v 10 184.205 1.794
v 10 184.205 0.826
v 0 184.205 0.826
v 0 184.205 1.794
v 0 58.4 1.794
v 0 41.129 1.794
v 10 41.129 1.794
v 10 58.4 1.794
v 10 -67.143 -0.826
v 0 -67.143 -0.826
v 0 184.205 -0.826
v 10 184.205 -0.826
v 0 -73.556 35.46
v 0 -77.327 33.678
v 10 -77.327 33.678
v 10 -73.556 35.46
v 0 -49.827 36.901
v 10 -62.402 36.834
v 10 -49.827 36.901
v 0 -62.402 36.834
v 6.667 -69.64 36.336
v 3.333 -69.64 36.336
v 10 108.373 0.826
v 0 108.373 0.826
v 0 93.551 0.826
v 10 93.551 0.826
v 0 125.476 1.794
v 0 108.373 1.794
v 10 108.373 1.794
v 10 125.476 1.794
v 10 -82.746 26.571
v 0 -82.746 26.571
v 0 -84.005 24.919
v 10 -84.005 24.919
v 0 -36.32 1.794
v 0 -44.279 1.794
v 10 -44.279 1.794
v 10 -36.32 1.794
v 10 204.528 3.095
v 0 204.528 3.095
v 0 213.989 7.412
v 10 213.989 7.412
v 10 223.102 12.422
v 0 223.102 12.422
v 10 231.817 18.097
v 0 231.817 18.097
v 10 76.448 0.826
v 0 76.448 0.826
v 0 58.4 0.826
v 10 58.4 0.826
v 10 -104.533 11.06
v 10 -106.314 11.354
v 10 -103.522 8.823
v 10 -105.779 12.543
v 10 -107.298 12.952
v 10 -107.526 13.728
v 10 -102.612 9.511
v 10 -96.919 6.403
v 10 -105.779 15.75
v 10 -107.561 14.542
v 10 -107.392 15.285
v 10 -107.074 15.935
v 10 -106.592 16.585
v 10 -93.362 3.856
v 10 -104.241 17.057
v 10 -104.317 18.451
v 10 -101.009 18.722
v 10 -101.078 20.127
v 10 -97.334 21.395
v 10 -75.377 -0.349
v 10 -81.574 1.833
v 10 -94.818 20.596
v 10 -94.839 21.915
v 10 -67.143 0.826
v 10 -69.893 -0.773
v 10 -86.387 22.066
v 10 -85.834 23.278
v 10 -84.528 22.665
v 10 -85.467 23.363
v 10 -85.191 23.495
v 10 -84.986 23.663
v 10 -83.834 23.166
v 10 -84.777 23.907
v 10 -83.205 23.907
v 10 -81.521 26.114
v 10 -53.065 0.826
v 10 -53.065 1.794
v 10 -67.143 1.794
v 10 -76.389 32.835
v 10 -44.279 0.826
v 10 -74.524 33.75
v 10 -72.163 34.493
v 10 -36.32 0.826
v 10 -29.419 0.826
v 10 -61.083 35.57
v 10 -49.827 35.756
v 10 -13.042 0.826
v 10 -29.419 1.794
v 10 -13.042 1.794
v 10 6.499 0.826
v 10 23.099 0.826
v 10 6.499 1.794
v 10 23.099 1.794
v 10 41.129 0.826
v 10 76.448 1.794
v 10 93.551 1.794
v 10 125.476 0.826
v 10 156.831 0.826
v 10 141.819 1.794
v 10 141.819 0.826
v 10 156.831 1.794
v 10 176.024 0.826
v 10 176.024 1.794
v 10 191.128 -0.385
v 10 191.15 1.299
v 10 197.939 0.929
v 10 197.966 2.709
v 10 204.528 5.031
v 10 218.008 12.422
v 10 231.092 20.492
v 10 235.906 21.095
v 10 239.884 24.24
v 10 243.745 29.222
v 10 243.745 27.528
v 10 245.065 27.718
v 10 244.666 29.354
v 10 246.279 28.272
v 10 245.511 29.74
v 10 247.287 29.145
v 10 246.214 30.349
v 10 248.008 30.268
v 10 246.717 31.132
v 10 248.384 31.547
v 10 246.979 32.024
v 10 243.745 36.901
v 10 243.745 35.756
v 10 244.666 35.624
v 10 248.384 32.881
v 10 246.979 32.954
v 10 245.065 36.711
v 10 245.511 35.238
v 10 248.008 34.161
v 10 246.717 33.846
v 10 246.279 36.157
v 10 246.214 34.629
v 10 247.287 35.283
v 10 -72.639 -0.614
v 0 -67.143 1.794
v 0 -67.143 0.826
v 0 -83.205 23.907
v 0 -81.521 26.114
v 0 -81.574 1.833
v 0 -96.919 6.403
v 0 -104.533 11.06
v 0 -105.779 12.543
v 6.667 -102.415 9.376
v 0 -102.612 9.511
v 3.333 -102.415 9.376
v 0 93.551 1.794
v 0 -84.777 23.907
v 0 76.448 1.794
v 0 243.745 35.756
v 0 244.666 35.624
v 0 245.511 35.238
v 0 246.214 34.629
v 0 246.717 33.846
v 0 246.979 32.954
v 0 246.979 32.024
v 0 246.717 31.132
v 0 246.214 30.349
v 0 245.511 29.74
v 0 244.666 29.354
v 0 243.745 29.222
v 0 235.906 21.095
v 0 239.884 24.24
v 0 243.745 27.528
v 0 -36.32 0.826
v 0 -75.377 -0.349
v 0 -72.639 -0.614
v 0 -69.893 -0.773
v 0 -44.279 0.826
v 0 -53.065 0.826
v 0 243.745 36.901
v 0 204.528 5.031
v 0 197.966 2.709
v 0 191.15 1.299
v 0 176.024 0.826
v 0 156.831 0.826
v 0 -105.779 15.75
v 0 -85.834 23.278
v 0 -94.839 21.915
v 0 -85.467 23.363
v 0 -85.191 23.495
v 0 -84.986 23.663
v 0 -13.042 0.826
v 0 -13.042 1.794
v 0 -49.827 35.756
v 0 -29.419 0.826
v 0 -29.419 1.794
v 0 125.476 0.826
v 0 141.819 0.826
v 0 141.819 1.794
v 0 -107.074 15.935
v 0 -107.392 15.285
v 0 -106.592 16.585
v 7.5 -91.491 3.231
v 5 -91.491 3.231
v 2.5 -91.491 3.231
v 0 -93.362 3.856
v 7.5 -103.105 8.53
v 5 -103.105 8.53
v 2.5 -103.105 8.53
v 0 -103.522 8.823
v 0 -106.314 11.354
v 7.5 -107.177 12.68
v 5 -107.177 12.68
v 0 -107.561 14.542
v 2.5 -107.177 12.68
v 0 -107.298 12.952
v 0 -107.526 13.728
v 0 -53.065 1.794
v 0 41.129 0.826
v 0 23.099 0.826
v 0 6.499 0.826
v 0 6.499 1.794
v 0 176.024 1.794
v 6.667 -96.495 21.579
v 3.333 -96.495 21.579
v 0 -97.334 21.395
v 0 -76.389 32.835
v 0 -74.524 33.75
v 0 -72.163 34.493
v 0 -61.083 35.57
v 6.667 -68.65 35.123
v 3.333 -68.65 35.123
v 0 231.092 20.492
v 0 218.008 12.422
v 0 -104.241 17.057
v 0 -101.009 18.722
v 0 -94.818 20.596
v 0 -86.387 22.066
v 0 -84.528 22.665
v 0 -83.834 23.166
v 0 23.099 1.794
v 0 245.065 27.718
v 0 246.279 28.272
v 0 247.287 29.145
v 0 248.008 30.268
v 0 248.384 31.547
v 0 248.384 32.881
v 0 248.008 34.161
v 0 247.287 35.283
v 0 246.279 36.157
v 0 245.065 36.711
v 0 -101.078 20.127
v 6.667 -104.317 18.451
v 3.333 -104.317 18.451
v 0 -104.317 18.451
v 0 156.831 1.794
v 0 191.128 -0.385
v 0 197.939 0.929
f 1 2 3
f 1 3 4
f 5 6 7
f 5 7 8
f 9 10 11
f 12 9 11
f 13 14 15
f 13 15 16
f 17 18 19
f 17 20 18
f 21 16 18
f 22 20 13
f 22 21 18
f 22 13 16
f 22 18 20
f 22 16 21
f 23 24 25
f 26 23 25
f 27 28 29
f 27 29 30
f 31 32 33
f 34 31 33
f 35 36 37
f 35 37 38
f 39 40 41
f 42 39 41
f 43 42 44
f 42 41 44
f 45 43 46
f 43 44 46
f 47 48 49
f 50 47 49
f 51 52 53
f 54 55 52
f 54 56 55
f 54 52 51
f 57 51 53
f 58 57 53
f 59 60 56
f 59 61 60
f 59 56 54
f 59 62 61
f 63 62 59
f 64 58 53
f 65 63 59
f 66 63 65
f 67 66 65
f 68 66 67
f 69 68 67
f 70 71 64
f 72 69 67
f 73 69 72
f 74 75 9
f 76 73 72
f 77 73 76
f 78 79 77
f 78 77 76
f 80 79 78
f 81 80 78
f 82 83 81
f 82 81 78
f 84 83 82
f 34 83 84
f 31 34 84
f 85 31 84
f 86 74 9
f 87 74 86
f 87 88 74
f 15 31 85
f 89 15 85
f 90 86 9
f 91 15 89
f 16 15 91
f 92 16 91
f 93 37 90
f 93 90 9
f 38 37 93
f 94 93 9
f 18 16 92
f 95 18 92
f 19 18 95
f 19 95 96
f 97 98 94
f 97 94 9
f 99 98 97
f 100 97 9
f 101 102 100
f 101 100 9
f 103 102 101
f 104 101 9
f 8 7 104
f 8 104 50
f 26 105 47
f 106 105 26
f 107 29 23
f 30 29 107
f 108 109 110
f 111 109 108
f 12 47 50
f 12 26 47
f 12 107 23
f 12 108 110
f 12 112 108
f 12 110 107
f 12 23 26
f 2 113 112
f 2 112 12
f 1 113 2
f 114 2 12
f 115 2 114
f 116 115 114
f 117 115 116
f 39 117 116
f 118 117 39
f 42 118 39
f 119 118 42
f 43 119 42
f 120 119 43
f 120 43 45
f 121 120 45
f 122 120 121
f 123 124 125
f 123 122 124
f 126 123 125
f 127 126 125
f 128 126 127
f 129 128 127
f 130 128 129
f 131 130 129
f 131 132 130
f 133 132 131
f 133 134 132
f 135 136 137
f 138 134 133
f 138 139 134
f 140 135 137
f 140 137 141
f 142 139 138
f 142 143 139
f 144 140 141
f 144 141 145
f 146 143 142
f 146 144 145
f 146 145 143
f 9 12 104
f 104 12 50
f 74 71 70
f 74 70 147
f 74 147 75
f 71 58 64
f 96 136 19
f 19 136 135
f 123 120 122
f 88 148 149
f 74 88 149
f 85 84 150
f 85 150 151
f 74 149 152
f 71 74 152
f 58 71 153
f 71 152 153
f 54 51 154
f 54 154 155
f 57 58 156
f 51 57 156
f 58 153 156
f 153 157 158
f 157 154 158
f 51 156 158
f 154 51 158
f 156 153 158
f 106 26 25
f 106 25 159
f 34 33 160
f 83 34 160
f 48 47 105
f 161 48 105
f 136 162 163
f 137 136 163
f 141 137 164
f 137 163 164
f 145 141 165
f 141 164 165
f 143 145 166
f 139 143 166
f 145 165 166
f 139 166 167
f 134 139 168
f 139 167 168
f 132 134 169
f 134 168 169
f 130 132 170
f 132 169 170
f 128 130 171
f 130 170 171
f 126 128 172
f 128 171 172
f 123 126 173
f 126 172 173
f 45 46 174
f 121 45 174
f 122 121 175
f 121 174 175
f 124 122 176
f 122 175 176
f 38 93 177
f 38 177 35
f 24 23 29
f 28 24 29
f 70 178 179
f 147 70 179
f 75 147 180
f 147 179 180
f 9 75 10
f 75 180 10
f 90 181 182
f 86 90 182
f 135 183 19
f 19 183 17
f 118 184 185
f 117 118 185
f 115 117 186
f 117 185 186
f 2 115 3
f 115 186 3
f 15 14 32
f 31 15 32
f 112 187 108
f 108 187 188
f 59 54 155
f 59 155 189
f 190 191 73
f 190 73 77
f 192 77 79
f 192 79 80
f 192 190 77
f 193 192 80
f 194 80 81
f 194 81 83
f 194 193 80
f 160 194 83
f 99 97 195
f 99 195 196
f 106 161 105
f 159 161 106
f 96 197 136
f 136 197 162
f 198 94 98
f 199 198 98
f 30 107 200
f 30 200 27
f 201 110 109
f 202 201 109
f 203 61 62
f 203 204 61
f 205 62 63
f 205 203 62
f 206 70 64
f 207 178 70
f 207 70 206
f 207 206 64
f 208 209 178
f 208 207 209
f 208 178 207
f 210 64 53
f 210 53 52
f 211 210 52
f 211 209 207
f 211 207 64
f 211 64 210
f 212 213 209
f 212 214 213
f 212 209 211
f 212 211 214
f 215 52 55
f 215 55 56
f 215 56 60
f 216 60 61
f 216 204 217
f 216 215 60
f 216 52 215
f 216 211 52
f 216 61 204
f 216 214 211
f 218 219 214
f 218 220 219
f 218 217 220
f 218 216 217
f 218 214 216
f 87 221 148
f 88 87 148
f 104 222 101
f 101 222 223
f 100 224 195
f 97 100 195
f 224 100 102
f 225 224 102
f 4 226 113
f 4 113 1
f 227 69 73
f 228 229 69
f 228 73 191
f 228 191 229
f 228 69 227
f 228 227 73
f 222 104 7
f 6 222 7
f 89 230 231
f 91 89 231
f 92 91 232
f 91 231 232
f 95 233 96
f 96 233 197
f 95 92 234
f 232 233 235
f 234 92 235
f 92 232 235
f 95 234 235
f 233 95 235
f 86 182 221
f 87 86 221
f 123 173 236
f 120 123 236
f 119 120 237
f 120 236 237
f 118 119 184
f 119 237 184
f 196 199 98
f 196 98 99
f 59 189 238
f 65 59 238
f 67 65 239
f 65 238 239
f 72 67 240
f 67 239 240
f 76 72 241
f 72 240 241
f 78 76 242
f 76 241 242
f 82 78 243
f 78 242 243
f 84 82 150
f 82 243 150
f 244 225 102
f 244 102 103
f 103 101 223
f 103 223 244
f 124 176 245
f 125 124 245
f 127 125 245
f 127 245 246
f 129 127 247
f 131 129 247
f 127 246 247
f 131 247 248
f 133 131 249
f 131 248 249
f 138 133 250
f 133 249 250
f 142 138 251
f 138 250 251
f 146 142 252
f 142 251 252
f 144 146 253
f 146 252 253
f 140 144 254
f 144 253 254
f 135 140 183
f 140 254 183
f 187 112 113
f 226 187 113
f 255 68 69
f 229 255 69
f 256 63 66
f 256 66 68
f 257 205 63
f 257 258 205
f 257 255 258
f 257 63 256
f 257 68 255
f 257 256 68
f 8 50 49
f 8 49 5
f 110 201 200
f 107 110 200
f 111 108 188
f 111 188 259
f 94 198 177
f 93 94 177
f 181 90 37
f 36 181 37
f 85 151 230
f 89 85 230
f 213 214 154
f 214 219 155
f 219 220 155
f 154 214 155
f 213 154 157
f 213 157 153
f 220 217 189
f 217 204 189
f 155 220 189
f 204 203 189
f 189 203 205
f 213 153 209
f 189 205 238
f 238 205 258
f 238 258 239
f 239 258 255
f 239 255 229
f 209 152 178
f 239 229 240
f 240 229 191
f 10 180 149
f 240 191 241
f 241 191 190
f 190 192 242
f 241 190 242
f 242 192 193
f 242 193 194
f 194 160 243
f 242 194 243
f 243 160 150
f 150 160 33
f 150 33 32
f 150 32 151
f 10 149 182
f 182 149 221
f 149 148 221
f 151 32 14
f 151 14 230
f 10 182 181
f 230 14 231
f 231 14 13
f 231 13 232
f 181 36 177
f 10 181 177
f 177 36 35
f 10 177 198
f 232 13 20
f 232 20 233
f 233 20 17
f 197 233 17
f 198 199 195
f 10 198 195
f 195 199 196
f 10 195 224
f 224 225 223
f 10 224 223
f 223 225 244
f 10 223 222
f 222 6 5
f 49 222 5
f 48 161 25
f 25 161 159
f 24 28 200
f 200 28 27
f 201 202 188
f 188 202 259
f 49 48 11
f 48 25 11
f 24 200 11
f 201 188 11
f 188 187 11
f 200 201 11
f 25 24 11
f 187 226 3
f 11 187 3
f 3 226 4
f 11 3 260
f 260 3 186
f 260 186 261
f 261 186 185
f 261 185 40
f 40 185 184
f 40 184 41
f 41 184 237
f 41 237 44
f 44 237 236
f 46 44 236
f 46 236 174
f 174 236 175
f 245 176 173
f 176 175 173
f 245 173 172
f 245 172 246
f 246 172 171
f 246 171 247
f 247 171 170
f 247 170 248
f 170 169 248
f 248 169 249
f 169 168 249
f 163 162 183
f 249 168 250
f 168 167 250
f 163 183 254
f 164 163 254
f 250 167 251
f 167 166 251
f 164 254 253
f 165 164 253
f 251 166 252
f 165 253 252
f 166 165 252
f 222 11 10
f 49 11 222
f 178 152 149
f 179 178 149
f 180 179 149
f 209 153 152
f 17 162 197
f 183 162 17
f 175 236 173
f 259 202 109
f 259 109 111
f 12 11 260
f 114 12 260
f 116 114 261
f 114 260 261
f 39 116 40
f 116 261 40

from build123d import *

# Parameters (mm, degrees)
F0_W     = 7.9592205584
F0_H     = 0.9682481177
F0_W_2   = 16.3772823289
F0_W_3   = 16.5999415331
F0_W_4   = 59.5395565033
F0_H_2   = 1.1446848512
F0_W_5   = 17.2708854079
F0_W_6   = 17.1027556062
F0_W_7   = 8.1813335419
F0_W_8   = 17.1027630568
F0_W_9   = 15.0124281645
F1_DEPTH = 10


with BuildPart() as f1:
    # F0 (on Right) → F1 (new body)
    with BuildSketch(Plane.YZ):
        with Locations((-40.2992907912, 1.3097476913)):
            Rectangle(F0_W, F0_H)
        with BuildLine():
            Line((-36.319680512, 0.8256236324), (-44.2789010704, 0.8256236324))
            Line((-44.2789010704, 0.8256236324), (-47.2884887369, 0.8256236324))
            add(Edge.make_bspline(
                [(-47.2884887369, 0.8256236324), (-51.1986791226, -0.4227987286), (-54.7682639191, 0.488674187), (-57.7987805009, 0.8256236324)],
                knots=[0.8788153386, 0.8788153386, 0.8788153386, 0.8788153386, 0.9375977313, 0.9375977313, 0.9375977313, 0.9375977313], degree=3))
            Line((-57.7987805009, 0.8256236324), (-67.1432688832, 0.8256236324))
            add(Edge.make_bspline(
                [(-67.1432688832, 0.8256236324), (-66.6509193776, -0.3373995266), (-66.5816717743, -0.6583984415), (-67.1432688832, -0.8256236324)],
                knots=[0.9569663892, 0.9569663892, 0.9569663892, 0.9569663892, 1, 1, 1, 1], degree=3))
            Line((-67.1432688832, -0.8256236324), (67.1432688832, -0.8256236324))
            Line((67.1432688832, -0.8256236324), (67.1432688832, 0.8256236324))
            Line((67.1432688832, 0.8256236324), (58.3999119699, 0.8256236324))
            Line((58.3999119699, 0.8256236324), (41.129026562, 0.8256236324))
            Line((41.129026562, 0.8256236324), (23.0985023081, 0.8256236324))
            Line((23.0985023081, 0.8256236324), (6.4985607751, 0.8256236324))
            Line((6.4985607751, 0.8256236324), (-13.0418827757, 0.8256236324))
            Line((-13.0418827757, 0.8256236324), (-29.4191651046, 0.8256236324))
            Line((-29.4191651046, 0.8256236324), (-36.319680512, 0.8256236324))
        make_face()
        with BuildLine():
            add(Edge.make_bspline(
                [(-47.2884887369, 0.8256236324), (-51.1986791226, -0.4227987286), (-54.7682639191, 0.488674187), (-57.7987805009, 0.8256236324)],
                knots=[0.8788153386, 0.8788153386, 0.8788153386, 0.8788153386, 0.9375977313, 0.9375977313, 0.9375977313, 0.9375977313], degree=3))
            Line((-47.2884887369, 0.8256236324), (-53.0654229224, 0.8256236324))
            Line((-53.0654229224, 0.8256236324), (-57.7987805009, 0.8256236324))
        make_face()
        with Locations((-21.2305239402, 1.3097476913)):
            Rectangle(F0_W_2, F0_H)
        with BuildLine():
            Line((-57.7987805009, 0.8256236324), (-53.0654229224, 0.8256236324))
            Line((-53.0654229224, 0.8256236324), (-53.0654229224, 1.7938717501))
            Line((-53.0654229224, 1.7938717501), (-67.1432688832, 1.7938717501))
            Line((-67.1432688832, 1.7938717501), (-67.1432688832, 0.8256236324))
            add(Edge.make_bspline(
                [(-57.7987805009, 0.8256236324), (-61.0159191969, 1.1833227475), (-63.6255527419, 0.8935602649), (-67.1432688832, 0.8256236324)],
                knots=[0.9375977313, 0.9375977313, 0.9375977313, 0.9375977313, 1, 1, 1, 1], degree=3))
        make_face()
        with BuildLine():
            Line((-67.1432688832, 0.8256236324), (-57.7987805009, 0.8256236324))
            add(Edge.make_bspline(
                [(-57.7987805009, 0.8256236324), (-61.0159191969, 1.1833227475), (-63.6255527419, 0.8935602649), (-67.1432688832, 0.8256236324)],
                knots=[0.9375977313, 0.9375977313, 0.9375977313, 0.9375977313, 1, 1, 1, 1], degree=3))
        make_face()
        with BuildLine():
            add(Edge.make_bspline(
                [(-67.1432688832, 0.8256236324), (-66.6509193776, -0.3373995266), (-66.5816717743, -0.6583984415), (-67.1432688832, -0.8256236324)],
                knots=[0.9569663892, 0.9569663892, 0.9569663892, 0.9569663892, 1, 1, 1, 1], degree=3))
            Line((-67.1432688832, 0.8256236324), (-67.1432688832, -0.8256236324))
        make_face()
        with BuildLine():
            Line((-67.1432688832, -0.8256236324), (-67.1432688832, 0.8256236324))
            add(Edge.make_bspline(
                [(-67.1432688832, 0.8256236324), (-72.0758134657, 0.7303628282), (-85.4966418977, 1.4113661542), (-101.3533463283, 7.9149516327), (-105.1493369808, 11.5436915404), (-105.7790592313, 12.5425305242)],
                knots=[0, 0, 0, 0, 0.0875005146, 0.1748037653, 0.2115887997, 0.2115887997, 0.2115887997, 0.2115887997], degree=3))
            add(Edge.make_bspline(
                [(-105.7790592313, 12.5425305242), (-105.9744112307, 12.8523896605), (-106.4393049893, 13.8046586359), (-106.4279219113, 14.6656665162), (-106.1115412671, 15.2586876195)],
                knots=[0.2115887997, 0.2115887997, 0.2115887997, 0.2115887997, 0.2230002275, 0.2475165519, 0.2475165519, 0.2475165519, 0.2475165519], degree=3))
            add(Edge.make_bspline(
                [(-106.1115412671, 15.2586876195), (-106.4280364897, 15.7186574339), (-106.5937697782, 16.1640910139), (-106.5921410918, 16.585284844)],
                knots=[0.9836293826, 0.9836293826, 0.9836293826, 0.9836293826, 1, 1, 1, 1], degree=3))
            add(Edge.make_bspline(
                [(-75.376854734, -0.3492794788), (-78.5187930994, 0.100372638), (-90.3610848386, 2.295926245), (-102.7291777595, 7.2472073243), (-108.1012203128, 12.9893553032), (-107.5215165975, 15.5146137824), (-106.5921410918, 16.585284844)],
                knots=[0.0801395338, 0.0801395338, 0.0801395338, 0.0801395338, 0.1438178441, 0.2897928885, 0.3749773752, 0.4363049571, 0.4363049571, 0.4363049571, 0.4363049571], degree=3))
            ThreePointArc((-75.376854734, -0.3492794788), (-71.2669456321, -0.7064381134), (-67.1432688832, -0.8256236324))
        make_face()
        with Locations((14.7985315416, 1.3097476913)):
            Rectangle(F0_W_3, F0_H)
        with BuildLine():
            Line((-49.8266220093, 35.7562787831), (-29.3324157713, 35.7562787831))
            add(Edge.make_bspline(
                [(-31.3463312427, 36.9009636343), (-30.6162211649, 36.6342598411), (-29.9359409959, 36.264957093), (-29.3600573473, 35.7800296462), (-29.3324157713, 35.7562787831)],
                knots=[0.5476252208, 0.5476252208, 0.5476252208, 0.5476252208, 0.5656279815, 0.5665441357, 0.5665441357, 0.5665441357, 0.5665441357], degree=3))
            Line((-31.3463312427, 36.9009636343), (-41.4767201262, 36.9009636343))
            add(Edge.make_bspline(
                [(-49.8266220093, 35.7562787831), (-46.6034582942, 35.95606144), (-43.9288870011, 36.4255610772), (-41.4767201262, 36.9009636343)],
                knots=[0.5976663005, 0.5976663005, 0.5976663005, 0.5976663005, 0.6382752389, 0.6382752389, 0.6382752389, 0.6382752389], degree=3))
        make_face()
        with BuildLine():
            add(Edge.make_bspline(
                [(-31.3463312427, 36.9009636343), (-30.6162211649, 36.6342598411), (-29.9359409959, 36.264957093), (-29.3600573473, 35.7800296462), (-29.3324157713, 35.7562787831)],
                knots=[0.5476252208, 0.5476252208, 0.5476252208, 0.5476252208, 0.5656279815, 0.5665441357, 0.5665441357, 0.5665441357, 0.5665441357], degree=3))
            Line((-29.3324157713, 35.7562787831), (-27.0790393766, 35.7562787831))
            add(Edge.make_bspline(
                [(-27.9329801586, 36.9009636343), (-27.5874335917, 36.590939793), (-27.2981663641, 36.213302791), (-27.0790393766, 35.7562787831)],
                knots=[0.7220869644, 0.7220869644, 0.7220869644, 0.7220869644, 0.7320653179, 0.7320653179, 0.7320653179, 0.7320653179], degree=3))
            Line((-27.9329801586, 36.9009636343), (-31.3463312427, 36.9009636343))
        make_face()
        with BuildLine():
            add(Edge.make_bspline(
                [(-27.9329801586, 36.9009636343), (-27.5874335917, 36.590939793), (-27.2981663641, 36.213302791), (-27.0790393766, 35.7562787831)],
                knots=[0.7220869644, 0.7220869644, 0.7220869644, 0.7220869644, 0.7320653179, 0.7320653179, 0.7320653179, 0.7320653179], degree=3))
            Line((-27.0790393766, 35.7562787831), (184.205442667, 35.7562787831))
            Line((184.205442667, 35.7562787831), (184.205442667, 36.9009636343))
            Line((184.205442667, 36.9009636343), (-27.9329801586, 36.9009636343))
        make_face()
        with BuildLine():
            Line((-83.2053124905, 23.9070430398), (-81.5205250131, 26.1137338048))
            add(Edge.make_bspline(
                [(-81.8276049313, 26.3324605583), (-81.7285806251, 26.2701481945), (-81.6261511228, 26.1970663843), (-81.5205250131, 26.1137338048)],
                knots=[0.7832802469, 0.7832802469, 0.7832802469, 0.7832802469, 0.7877852316, 0.7877852316, 0.7877852316, 0.7877852316], degree=3))
            add(Edge.make_bspline(
                [(-83.2053124905, 23.9070430398), (-82.7734139474, 24.5261063334), (-82.337894388, 25.3786099624), (-81.8276049313, 26.3324605583)],
                knots=[0.4237232055, 0.4237232055, 0.4237232055, 0.4237232055, 0.4446888147, 0.4446888147, 0.4446888147, 0.4446888147], degree=3))
        make_face()
        with BuildLine():
            add(Edge.make_bspline(
                [(-81.8276049313, 26.3324605583), (-81.7285806251, 26.2701481945), (-81.6261511228, 26.1970663843), (-81.5205250131, 26.1137338048)],
                knots=[0.7832802469, 0.7832802469, 0.7832802469, 0.7832802469, 0.7877852316, 0.7877852316, 0.7877852316, 0.7877852316], degree=3))
            Line((-81.5205250131, 26.1137338048), (-76.3889253139, 32.834969461))
            add(Edge.make_bspline(
                [(-81.8276049313, 26.3324605583), (-80.6726743978, 28.4912964173), (-79.1347380919, 31.1692780126), (-76.3889253139, 32.834969461)],
                knots=[0.4446888147, 0.4446888147, 0.4446888147, 0.4446888147, 0.4921399658, 0.4921399658, 0.4921399658, 0.4921399658], degree=3))
        make_face()
        with BuildLine():
            Line((-105.7790592313, 12.5425305242), (-105.7790592313, 14.8325555243))
            add(Edge.make_bspline(
                [(-105.7790592313, 14.8325555243), (-105.9036909626, 14.9757756925), (-106.0146769352, 15.1179124494), (-106.1115412671, 15.2586876195)],
                knots=[0.978619105, 0.978619105, 0.978619105, 0.978619105, 0.9836293826, 0.9836293826, 0.9836293826, 0.9836293826], degree=3))
            add(Edge.make_bspline(
                [(-105.7790592313, 12.5425305242), (-105.9744112307, 12.8523896605), (-106.4393049893, 13.8046586359), (-106.4279219113, 14.6656665162), (-106.1115412671, 15.2586876195)],
                knots=[0.2115887997, 0.2115887997, 0.2115887997, 0.2115887997, 0.2230002275, 0.2475165519, 0.2475165519, 0.2475165519, 0.2475165519], degree=3))
        make_face()
        with BuildLine():
            add(Edge.make_bspline(
                [(-105.7790592313, 14.8325555243), (-105.9036909626, 14.9757756925), (-106.0146769352, 15.1179124494), (-106.1115412671, 15.2586876195)],
                knots=[0.978619105, 0.978619105, 0.978619105, 0.978619105, 0.9836293826, 0.9836293826, 0.9836293826, 0.9836293826], degree=3))
            Line((-105.7790592313, 14.8325555243), (-105.7790592313, 15.7497413456))
            add(Edge.make_bspline(
                [(-106.1115412671, 15.2586876195), (-106.0246124997, 15.4216261385), (-105.9143855758, 15.5849789536), (-105.7790592313, 15.7497413456)],
                knots=[0.2475165519, 0.2475165519, 0.2475165519, 0.2475165519, 0.2542526589, 0.2542526589, 0.2542526589, 0.2542526589], degree=3))
        make_face()
        with BuildLine():
            Line((-49.8266220093, 36.9009636343), (-49.8266220093, 35.7562787831))
            add(Edge.make_bspline(
                [(-49.8266220093, 35.7562787831), (-46.6034582942, 35.95606144), (-43.9288870011, 36.4255610772), (-41.4767201262, 36.9009636343)],
                knots=[0.5976663005, 0.5976663005, 0.5976663005, 0.5976663005, 0.6382752389, 0.6382752389, 0.6382752389, 0.6382752389], degree=3))
            Line((-41.4767201262, 36.9009636343), (-49.8266220093, 36.9009636343))
        make_face()
        with BuildLine():
            add(Edge.make_bspline(
                [(-76.3889253139, 32.834969461), (-70.2825284986, 36.5392908326), (-58.2023310565, 35.23712383), (-49.8266220093, 35.7562787831)],
                knots=[0.4921399658, 0.4921399658, 0.4921399658, 0.4921399658, 0.5976663005, 0.5976663005, 0.5976663005, 0.5976663005], degree=3))
            Line((-49.8266220093, 35.7562787831), (-49.8266220093, 36.9009636343))
            add(Edge.make_bspline(
                [(-77.3271471262, 33.6782447994), (-71.0137479896, 37.9678944533), (-59.9470632222, 36.5232924918), (-49.8266220093, 36.9009636343)],
                knots=[0.3035636496, 0.3035636496, 0.3035636496, 0.3035636496, 0.4445217782, 0.4445217782, 0.4445217782, 0.4445217782], degree=3))
            Line((-77.3271471262, 33.6782447994), (-82.7458889947, 26.570704936))
            add(Edge.make_bspline(
                [(-82.7458889947, 26.570704936), (-82.6409378067, 26.595297775), (-82.3634844697, 26.6047383627), (-82.0375313521, 26.4645595549), (-81.8276049313, 26.3324605583)],
                knots=[0.767285406, 0.767285406, 0.767285406, 0.767285406, 0.7737299116, 0.7832802469, 0.7832802469, 0.7832802469, 0.7832802469], degree=3))
            add(Edge.make_bspline(
                [(-81.8276049313, 26.3324605583), (-80.6726743978, 28.4912964173), (-79.1347380919, 31.1692780126), (-76.3889253139, 32.834969461)],
                knots=[0.4446888147, 0.4446888147, 0.4446888147, 0.4446888147, 0.4921399658, 0.4921399658, 0.4921399658, 0.4921399658], degree=3))
        make_face()
        with Locations((213.9752209187, 36.3286212087)):
            Rectangle(F0_W_4, F0_H_2)
        with BuildLine():
            add(Edge.make_bspline(
                [(-83.2053124905, 23.9070430398), (-82.7734139474, 24.5261063334), (-82.337894388, 25.3786099624), (-81.8276049313, 26.3324605583)],
                knots=[0.4237232055, 0.4237232055, 0.4237232055, 0.4237232055, 0.4446888147, 0.4446888147, 0.4446888147, 0.4446888147], degree=3))
            add(Edge.make_bspline(
                [(-82.7458889947, 26.570704936), (-82.6409378067, 26.595297775), (-82.3634844697, 26.6047383627), (-82.0375313521, 26.4645595549), (-81.8276049313, 26.3324605583)],
                knots=[0.767285406, 0.767285406, 0.767285406, 0.767285406, 0.7737299116, 0.7832802469, 0.7832802469, 0.7832802469, 0.7832802469], degree=3))
            Line((-82.7458889947, 26.570704936), (-84.0048450328, 24.9193843076))
            add(Edge.make_bspline(
                [(-94.8389886697, 21.9150389209), (-91.9546645853, 22.3878238509), (-87.3974074928, 22.4492787894), (-84.977370385, 22.3216318756), (-84.2595160002, 24.3097150361), (-84.0048450328, 24.9193843076)],
                knots=[0.5679522733, 0.5679522733, 0.5679522733, 0.5679522733, 0.6501774444, 0.7059587467, 0.7326988833, 0.7326988833, 0.7326988833, 0.7326988833], degree=3))
            add(Edge.make_bspline(
                [(-97.3343178856, 21.3945470699), (-96.4935969707, 21.584978542), (-95.6568843275, 21.7579506298), (-94.8389886865, 21.9150389176)],
                knots=[0.0865231218, 0.0865231218, 0.0865231218, 0.0865231218, 0.1024560332, 0.1024560332, 0.1024560332, 0.1024560332], degree=3))
            add(Edge.make_bspline(
                [(-106.5921410918, 16.585284844), (-104.9529463621, 18.4736909304), (-101.1774679584, 20.4045249526), (-97.3343178855, 21.3945470692)],
                knots=[0.4363049571, 0.4363049571, 0.4363049571, 0.4363049571, 0.5444720527, 0.5444720527, 0.5444720527, 0.5444720527], degree=3))
            add(Edge.make_bspline(
                [(-106.1115412671, 15.2586876195), (-106.4280364897, 15.7186574339), (-106.5937697782, 16.1640910139), (-106.5921410918, 16.585284844)],
                knots=[0.9836293826, 0.9836293826, 0.9836293826, 0.9836293826, 1, 1, 1, 1], degree=3))
            add(Edge.make_bspline(
                [(-106.1115412671, 15.2586876195), (-106.0246124997, 15.4216261385), (-105.9143855758, 15.5849789536), (-105.7790592313, 15.7497413456)],
                knots=[0.2475165519, 0.2475165519, 0.2475165519, 0.2475165519, 0.2542526589, 0.2542526589, 0.2542526589, 0.2542526589], degree=3))
            add(Edge.make_bspline(
                [(-105.7790592313, 15.7497413456), (-104.5149320358, 17.2888401911), (-97.2837116626, 20.7682618377), (-86.1446484374, 21.7822829697), (-83.9828873041, 22.7925034497), (-83.2053124905, 23.9070430398)],
                knots=[0.2542526589, 0.2542526589, 0.2542526589, 0.2542526589, 0.3171768152, 0.3859774667, 0.4237232055, 0.4237232055, 0.4237232055, 0.4237232055], degree=3))
        make_face()
        Polygon((67.1432688832, 0.8256236324), (67.1432688832, -0.8256236324), (184.205442667, -0.8256236324), (184.205442667, 0.8256236324), (176.0241091251, 0.8256236324), (156.8310111761, 0.8256236324), (141.8185830116, 0.8256236324), (125.4759579897, 0.8256236324), (108.3731949329, 0.8256236324), (93.5508012772, 0.8256236324), (76.448045671, 0.8256236324), align=None)
        with Locations((49.7644692659, 1.3097476913)):
            Rectangle(F0_W_5, F0_H)
        with BuildLine():
            Line((243.7449991703, 36.9009636343), (243.7449991703, 35.7562787831))
            ThreePointArc((243.7449991703, 35.7562787831), (247.0123348758, 32.4889430776), (243.7449991703, 29.2216073722))
            Line((243.7449991703, 29.2216073722), (243.7449991703, 27.5277942419))
            ThreePointArc((243.7449991703, 27.5277942419), (248.4315838665, 32.2143789381), (243.7449991703, 36.9009636343))
        make_face()
        with BuildLine():
            Line((184.205442667, 0.8256236324), (184.205442667, -0.8256236324))
            ThreePointArc((184.205442667, -0.8256236324), (194.5543556633, 0.1635588042), (204.5284956694, 3.0952841043))
            ThreePointArc((204.5284956694, 3.0952841043), (218.592518618, 9.8322781675), (231.8167869207, 18.0968143531))
            ThreePointArc((231.8167869207, 18.0968143531), (237.9094832192, 22.6496646882), (243.7449991703, 27.5277942419))
            Line((243.7449991703, 27.5277942419), (243.7449991703, 29.2216073722))
            ThreePointArc((243.7449991703, 29.2216073722), (224.6014403462, 16.3731386899), (204.5284956694, 5.0313626416))
            ThreePointArc((204.5284956694, 5.0313626416), (194.5822765284, 1.8880807661), (184.205442667, 0.8256236324))
        make_face()
        with BuildLine():
            add(Edge.make_bspline(
                [(-94.8389886697, 21.9150389209), (-91.9546645853, 22.3878238509), (-87.3974074928, 22.4492787894), (-84.977370385, 22.3216318756), (-84.2595160002, 24.3097150361), (-84.0048450328, 24.9193843076)],
                knots=[0.5679522733, 0.5679522733, 0.5679522733, 0.5679522733, 0.6501774444, 0.7059587467, 0.7326988833, 0.7326988833, 0.7326988833, 0.7326988833], degree=3))
            Line((-84.0048450328, 24.9193843076), (-84.7766473889, 23.9070430398))
            add(Edge.make_bspline(
                [(-94.8389886697, 21.9150389209), (-91.0215834223, 22.6482249451), (-86.1091370373, 23.2063937055), (-85.1780004227, 23.3783596749), (-84.7766473889, 23.9070430398)],
                knots=[0.1024560332, 0.1024560332, 0.1024560332, 0.1024560332, 0.1768205078, 0.2096643307, 0.2096643307, 0.2096643307, 0.2096643307], degree=3))
        make_face()
        with Locations((84.9994234741, 1.3097476913)):
            Rectangle(F0_W_6, F0_H)
        with Locations((180.1147758961, 1.3097476913)):
            Rectangle(F0_W_7, F0_H)
        with Locations((116.9245764613, 1.3097476913)):
            Rectangle(F0_W_8, F0_H)
        with Locations((149.3247970939, 1.3097476913)):
            Rectangle(F0_W_9, F0_H)
    extrude(amount=F1_DEPTH)


solid = f1.part
